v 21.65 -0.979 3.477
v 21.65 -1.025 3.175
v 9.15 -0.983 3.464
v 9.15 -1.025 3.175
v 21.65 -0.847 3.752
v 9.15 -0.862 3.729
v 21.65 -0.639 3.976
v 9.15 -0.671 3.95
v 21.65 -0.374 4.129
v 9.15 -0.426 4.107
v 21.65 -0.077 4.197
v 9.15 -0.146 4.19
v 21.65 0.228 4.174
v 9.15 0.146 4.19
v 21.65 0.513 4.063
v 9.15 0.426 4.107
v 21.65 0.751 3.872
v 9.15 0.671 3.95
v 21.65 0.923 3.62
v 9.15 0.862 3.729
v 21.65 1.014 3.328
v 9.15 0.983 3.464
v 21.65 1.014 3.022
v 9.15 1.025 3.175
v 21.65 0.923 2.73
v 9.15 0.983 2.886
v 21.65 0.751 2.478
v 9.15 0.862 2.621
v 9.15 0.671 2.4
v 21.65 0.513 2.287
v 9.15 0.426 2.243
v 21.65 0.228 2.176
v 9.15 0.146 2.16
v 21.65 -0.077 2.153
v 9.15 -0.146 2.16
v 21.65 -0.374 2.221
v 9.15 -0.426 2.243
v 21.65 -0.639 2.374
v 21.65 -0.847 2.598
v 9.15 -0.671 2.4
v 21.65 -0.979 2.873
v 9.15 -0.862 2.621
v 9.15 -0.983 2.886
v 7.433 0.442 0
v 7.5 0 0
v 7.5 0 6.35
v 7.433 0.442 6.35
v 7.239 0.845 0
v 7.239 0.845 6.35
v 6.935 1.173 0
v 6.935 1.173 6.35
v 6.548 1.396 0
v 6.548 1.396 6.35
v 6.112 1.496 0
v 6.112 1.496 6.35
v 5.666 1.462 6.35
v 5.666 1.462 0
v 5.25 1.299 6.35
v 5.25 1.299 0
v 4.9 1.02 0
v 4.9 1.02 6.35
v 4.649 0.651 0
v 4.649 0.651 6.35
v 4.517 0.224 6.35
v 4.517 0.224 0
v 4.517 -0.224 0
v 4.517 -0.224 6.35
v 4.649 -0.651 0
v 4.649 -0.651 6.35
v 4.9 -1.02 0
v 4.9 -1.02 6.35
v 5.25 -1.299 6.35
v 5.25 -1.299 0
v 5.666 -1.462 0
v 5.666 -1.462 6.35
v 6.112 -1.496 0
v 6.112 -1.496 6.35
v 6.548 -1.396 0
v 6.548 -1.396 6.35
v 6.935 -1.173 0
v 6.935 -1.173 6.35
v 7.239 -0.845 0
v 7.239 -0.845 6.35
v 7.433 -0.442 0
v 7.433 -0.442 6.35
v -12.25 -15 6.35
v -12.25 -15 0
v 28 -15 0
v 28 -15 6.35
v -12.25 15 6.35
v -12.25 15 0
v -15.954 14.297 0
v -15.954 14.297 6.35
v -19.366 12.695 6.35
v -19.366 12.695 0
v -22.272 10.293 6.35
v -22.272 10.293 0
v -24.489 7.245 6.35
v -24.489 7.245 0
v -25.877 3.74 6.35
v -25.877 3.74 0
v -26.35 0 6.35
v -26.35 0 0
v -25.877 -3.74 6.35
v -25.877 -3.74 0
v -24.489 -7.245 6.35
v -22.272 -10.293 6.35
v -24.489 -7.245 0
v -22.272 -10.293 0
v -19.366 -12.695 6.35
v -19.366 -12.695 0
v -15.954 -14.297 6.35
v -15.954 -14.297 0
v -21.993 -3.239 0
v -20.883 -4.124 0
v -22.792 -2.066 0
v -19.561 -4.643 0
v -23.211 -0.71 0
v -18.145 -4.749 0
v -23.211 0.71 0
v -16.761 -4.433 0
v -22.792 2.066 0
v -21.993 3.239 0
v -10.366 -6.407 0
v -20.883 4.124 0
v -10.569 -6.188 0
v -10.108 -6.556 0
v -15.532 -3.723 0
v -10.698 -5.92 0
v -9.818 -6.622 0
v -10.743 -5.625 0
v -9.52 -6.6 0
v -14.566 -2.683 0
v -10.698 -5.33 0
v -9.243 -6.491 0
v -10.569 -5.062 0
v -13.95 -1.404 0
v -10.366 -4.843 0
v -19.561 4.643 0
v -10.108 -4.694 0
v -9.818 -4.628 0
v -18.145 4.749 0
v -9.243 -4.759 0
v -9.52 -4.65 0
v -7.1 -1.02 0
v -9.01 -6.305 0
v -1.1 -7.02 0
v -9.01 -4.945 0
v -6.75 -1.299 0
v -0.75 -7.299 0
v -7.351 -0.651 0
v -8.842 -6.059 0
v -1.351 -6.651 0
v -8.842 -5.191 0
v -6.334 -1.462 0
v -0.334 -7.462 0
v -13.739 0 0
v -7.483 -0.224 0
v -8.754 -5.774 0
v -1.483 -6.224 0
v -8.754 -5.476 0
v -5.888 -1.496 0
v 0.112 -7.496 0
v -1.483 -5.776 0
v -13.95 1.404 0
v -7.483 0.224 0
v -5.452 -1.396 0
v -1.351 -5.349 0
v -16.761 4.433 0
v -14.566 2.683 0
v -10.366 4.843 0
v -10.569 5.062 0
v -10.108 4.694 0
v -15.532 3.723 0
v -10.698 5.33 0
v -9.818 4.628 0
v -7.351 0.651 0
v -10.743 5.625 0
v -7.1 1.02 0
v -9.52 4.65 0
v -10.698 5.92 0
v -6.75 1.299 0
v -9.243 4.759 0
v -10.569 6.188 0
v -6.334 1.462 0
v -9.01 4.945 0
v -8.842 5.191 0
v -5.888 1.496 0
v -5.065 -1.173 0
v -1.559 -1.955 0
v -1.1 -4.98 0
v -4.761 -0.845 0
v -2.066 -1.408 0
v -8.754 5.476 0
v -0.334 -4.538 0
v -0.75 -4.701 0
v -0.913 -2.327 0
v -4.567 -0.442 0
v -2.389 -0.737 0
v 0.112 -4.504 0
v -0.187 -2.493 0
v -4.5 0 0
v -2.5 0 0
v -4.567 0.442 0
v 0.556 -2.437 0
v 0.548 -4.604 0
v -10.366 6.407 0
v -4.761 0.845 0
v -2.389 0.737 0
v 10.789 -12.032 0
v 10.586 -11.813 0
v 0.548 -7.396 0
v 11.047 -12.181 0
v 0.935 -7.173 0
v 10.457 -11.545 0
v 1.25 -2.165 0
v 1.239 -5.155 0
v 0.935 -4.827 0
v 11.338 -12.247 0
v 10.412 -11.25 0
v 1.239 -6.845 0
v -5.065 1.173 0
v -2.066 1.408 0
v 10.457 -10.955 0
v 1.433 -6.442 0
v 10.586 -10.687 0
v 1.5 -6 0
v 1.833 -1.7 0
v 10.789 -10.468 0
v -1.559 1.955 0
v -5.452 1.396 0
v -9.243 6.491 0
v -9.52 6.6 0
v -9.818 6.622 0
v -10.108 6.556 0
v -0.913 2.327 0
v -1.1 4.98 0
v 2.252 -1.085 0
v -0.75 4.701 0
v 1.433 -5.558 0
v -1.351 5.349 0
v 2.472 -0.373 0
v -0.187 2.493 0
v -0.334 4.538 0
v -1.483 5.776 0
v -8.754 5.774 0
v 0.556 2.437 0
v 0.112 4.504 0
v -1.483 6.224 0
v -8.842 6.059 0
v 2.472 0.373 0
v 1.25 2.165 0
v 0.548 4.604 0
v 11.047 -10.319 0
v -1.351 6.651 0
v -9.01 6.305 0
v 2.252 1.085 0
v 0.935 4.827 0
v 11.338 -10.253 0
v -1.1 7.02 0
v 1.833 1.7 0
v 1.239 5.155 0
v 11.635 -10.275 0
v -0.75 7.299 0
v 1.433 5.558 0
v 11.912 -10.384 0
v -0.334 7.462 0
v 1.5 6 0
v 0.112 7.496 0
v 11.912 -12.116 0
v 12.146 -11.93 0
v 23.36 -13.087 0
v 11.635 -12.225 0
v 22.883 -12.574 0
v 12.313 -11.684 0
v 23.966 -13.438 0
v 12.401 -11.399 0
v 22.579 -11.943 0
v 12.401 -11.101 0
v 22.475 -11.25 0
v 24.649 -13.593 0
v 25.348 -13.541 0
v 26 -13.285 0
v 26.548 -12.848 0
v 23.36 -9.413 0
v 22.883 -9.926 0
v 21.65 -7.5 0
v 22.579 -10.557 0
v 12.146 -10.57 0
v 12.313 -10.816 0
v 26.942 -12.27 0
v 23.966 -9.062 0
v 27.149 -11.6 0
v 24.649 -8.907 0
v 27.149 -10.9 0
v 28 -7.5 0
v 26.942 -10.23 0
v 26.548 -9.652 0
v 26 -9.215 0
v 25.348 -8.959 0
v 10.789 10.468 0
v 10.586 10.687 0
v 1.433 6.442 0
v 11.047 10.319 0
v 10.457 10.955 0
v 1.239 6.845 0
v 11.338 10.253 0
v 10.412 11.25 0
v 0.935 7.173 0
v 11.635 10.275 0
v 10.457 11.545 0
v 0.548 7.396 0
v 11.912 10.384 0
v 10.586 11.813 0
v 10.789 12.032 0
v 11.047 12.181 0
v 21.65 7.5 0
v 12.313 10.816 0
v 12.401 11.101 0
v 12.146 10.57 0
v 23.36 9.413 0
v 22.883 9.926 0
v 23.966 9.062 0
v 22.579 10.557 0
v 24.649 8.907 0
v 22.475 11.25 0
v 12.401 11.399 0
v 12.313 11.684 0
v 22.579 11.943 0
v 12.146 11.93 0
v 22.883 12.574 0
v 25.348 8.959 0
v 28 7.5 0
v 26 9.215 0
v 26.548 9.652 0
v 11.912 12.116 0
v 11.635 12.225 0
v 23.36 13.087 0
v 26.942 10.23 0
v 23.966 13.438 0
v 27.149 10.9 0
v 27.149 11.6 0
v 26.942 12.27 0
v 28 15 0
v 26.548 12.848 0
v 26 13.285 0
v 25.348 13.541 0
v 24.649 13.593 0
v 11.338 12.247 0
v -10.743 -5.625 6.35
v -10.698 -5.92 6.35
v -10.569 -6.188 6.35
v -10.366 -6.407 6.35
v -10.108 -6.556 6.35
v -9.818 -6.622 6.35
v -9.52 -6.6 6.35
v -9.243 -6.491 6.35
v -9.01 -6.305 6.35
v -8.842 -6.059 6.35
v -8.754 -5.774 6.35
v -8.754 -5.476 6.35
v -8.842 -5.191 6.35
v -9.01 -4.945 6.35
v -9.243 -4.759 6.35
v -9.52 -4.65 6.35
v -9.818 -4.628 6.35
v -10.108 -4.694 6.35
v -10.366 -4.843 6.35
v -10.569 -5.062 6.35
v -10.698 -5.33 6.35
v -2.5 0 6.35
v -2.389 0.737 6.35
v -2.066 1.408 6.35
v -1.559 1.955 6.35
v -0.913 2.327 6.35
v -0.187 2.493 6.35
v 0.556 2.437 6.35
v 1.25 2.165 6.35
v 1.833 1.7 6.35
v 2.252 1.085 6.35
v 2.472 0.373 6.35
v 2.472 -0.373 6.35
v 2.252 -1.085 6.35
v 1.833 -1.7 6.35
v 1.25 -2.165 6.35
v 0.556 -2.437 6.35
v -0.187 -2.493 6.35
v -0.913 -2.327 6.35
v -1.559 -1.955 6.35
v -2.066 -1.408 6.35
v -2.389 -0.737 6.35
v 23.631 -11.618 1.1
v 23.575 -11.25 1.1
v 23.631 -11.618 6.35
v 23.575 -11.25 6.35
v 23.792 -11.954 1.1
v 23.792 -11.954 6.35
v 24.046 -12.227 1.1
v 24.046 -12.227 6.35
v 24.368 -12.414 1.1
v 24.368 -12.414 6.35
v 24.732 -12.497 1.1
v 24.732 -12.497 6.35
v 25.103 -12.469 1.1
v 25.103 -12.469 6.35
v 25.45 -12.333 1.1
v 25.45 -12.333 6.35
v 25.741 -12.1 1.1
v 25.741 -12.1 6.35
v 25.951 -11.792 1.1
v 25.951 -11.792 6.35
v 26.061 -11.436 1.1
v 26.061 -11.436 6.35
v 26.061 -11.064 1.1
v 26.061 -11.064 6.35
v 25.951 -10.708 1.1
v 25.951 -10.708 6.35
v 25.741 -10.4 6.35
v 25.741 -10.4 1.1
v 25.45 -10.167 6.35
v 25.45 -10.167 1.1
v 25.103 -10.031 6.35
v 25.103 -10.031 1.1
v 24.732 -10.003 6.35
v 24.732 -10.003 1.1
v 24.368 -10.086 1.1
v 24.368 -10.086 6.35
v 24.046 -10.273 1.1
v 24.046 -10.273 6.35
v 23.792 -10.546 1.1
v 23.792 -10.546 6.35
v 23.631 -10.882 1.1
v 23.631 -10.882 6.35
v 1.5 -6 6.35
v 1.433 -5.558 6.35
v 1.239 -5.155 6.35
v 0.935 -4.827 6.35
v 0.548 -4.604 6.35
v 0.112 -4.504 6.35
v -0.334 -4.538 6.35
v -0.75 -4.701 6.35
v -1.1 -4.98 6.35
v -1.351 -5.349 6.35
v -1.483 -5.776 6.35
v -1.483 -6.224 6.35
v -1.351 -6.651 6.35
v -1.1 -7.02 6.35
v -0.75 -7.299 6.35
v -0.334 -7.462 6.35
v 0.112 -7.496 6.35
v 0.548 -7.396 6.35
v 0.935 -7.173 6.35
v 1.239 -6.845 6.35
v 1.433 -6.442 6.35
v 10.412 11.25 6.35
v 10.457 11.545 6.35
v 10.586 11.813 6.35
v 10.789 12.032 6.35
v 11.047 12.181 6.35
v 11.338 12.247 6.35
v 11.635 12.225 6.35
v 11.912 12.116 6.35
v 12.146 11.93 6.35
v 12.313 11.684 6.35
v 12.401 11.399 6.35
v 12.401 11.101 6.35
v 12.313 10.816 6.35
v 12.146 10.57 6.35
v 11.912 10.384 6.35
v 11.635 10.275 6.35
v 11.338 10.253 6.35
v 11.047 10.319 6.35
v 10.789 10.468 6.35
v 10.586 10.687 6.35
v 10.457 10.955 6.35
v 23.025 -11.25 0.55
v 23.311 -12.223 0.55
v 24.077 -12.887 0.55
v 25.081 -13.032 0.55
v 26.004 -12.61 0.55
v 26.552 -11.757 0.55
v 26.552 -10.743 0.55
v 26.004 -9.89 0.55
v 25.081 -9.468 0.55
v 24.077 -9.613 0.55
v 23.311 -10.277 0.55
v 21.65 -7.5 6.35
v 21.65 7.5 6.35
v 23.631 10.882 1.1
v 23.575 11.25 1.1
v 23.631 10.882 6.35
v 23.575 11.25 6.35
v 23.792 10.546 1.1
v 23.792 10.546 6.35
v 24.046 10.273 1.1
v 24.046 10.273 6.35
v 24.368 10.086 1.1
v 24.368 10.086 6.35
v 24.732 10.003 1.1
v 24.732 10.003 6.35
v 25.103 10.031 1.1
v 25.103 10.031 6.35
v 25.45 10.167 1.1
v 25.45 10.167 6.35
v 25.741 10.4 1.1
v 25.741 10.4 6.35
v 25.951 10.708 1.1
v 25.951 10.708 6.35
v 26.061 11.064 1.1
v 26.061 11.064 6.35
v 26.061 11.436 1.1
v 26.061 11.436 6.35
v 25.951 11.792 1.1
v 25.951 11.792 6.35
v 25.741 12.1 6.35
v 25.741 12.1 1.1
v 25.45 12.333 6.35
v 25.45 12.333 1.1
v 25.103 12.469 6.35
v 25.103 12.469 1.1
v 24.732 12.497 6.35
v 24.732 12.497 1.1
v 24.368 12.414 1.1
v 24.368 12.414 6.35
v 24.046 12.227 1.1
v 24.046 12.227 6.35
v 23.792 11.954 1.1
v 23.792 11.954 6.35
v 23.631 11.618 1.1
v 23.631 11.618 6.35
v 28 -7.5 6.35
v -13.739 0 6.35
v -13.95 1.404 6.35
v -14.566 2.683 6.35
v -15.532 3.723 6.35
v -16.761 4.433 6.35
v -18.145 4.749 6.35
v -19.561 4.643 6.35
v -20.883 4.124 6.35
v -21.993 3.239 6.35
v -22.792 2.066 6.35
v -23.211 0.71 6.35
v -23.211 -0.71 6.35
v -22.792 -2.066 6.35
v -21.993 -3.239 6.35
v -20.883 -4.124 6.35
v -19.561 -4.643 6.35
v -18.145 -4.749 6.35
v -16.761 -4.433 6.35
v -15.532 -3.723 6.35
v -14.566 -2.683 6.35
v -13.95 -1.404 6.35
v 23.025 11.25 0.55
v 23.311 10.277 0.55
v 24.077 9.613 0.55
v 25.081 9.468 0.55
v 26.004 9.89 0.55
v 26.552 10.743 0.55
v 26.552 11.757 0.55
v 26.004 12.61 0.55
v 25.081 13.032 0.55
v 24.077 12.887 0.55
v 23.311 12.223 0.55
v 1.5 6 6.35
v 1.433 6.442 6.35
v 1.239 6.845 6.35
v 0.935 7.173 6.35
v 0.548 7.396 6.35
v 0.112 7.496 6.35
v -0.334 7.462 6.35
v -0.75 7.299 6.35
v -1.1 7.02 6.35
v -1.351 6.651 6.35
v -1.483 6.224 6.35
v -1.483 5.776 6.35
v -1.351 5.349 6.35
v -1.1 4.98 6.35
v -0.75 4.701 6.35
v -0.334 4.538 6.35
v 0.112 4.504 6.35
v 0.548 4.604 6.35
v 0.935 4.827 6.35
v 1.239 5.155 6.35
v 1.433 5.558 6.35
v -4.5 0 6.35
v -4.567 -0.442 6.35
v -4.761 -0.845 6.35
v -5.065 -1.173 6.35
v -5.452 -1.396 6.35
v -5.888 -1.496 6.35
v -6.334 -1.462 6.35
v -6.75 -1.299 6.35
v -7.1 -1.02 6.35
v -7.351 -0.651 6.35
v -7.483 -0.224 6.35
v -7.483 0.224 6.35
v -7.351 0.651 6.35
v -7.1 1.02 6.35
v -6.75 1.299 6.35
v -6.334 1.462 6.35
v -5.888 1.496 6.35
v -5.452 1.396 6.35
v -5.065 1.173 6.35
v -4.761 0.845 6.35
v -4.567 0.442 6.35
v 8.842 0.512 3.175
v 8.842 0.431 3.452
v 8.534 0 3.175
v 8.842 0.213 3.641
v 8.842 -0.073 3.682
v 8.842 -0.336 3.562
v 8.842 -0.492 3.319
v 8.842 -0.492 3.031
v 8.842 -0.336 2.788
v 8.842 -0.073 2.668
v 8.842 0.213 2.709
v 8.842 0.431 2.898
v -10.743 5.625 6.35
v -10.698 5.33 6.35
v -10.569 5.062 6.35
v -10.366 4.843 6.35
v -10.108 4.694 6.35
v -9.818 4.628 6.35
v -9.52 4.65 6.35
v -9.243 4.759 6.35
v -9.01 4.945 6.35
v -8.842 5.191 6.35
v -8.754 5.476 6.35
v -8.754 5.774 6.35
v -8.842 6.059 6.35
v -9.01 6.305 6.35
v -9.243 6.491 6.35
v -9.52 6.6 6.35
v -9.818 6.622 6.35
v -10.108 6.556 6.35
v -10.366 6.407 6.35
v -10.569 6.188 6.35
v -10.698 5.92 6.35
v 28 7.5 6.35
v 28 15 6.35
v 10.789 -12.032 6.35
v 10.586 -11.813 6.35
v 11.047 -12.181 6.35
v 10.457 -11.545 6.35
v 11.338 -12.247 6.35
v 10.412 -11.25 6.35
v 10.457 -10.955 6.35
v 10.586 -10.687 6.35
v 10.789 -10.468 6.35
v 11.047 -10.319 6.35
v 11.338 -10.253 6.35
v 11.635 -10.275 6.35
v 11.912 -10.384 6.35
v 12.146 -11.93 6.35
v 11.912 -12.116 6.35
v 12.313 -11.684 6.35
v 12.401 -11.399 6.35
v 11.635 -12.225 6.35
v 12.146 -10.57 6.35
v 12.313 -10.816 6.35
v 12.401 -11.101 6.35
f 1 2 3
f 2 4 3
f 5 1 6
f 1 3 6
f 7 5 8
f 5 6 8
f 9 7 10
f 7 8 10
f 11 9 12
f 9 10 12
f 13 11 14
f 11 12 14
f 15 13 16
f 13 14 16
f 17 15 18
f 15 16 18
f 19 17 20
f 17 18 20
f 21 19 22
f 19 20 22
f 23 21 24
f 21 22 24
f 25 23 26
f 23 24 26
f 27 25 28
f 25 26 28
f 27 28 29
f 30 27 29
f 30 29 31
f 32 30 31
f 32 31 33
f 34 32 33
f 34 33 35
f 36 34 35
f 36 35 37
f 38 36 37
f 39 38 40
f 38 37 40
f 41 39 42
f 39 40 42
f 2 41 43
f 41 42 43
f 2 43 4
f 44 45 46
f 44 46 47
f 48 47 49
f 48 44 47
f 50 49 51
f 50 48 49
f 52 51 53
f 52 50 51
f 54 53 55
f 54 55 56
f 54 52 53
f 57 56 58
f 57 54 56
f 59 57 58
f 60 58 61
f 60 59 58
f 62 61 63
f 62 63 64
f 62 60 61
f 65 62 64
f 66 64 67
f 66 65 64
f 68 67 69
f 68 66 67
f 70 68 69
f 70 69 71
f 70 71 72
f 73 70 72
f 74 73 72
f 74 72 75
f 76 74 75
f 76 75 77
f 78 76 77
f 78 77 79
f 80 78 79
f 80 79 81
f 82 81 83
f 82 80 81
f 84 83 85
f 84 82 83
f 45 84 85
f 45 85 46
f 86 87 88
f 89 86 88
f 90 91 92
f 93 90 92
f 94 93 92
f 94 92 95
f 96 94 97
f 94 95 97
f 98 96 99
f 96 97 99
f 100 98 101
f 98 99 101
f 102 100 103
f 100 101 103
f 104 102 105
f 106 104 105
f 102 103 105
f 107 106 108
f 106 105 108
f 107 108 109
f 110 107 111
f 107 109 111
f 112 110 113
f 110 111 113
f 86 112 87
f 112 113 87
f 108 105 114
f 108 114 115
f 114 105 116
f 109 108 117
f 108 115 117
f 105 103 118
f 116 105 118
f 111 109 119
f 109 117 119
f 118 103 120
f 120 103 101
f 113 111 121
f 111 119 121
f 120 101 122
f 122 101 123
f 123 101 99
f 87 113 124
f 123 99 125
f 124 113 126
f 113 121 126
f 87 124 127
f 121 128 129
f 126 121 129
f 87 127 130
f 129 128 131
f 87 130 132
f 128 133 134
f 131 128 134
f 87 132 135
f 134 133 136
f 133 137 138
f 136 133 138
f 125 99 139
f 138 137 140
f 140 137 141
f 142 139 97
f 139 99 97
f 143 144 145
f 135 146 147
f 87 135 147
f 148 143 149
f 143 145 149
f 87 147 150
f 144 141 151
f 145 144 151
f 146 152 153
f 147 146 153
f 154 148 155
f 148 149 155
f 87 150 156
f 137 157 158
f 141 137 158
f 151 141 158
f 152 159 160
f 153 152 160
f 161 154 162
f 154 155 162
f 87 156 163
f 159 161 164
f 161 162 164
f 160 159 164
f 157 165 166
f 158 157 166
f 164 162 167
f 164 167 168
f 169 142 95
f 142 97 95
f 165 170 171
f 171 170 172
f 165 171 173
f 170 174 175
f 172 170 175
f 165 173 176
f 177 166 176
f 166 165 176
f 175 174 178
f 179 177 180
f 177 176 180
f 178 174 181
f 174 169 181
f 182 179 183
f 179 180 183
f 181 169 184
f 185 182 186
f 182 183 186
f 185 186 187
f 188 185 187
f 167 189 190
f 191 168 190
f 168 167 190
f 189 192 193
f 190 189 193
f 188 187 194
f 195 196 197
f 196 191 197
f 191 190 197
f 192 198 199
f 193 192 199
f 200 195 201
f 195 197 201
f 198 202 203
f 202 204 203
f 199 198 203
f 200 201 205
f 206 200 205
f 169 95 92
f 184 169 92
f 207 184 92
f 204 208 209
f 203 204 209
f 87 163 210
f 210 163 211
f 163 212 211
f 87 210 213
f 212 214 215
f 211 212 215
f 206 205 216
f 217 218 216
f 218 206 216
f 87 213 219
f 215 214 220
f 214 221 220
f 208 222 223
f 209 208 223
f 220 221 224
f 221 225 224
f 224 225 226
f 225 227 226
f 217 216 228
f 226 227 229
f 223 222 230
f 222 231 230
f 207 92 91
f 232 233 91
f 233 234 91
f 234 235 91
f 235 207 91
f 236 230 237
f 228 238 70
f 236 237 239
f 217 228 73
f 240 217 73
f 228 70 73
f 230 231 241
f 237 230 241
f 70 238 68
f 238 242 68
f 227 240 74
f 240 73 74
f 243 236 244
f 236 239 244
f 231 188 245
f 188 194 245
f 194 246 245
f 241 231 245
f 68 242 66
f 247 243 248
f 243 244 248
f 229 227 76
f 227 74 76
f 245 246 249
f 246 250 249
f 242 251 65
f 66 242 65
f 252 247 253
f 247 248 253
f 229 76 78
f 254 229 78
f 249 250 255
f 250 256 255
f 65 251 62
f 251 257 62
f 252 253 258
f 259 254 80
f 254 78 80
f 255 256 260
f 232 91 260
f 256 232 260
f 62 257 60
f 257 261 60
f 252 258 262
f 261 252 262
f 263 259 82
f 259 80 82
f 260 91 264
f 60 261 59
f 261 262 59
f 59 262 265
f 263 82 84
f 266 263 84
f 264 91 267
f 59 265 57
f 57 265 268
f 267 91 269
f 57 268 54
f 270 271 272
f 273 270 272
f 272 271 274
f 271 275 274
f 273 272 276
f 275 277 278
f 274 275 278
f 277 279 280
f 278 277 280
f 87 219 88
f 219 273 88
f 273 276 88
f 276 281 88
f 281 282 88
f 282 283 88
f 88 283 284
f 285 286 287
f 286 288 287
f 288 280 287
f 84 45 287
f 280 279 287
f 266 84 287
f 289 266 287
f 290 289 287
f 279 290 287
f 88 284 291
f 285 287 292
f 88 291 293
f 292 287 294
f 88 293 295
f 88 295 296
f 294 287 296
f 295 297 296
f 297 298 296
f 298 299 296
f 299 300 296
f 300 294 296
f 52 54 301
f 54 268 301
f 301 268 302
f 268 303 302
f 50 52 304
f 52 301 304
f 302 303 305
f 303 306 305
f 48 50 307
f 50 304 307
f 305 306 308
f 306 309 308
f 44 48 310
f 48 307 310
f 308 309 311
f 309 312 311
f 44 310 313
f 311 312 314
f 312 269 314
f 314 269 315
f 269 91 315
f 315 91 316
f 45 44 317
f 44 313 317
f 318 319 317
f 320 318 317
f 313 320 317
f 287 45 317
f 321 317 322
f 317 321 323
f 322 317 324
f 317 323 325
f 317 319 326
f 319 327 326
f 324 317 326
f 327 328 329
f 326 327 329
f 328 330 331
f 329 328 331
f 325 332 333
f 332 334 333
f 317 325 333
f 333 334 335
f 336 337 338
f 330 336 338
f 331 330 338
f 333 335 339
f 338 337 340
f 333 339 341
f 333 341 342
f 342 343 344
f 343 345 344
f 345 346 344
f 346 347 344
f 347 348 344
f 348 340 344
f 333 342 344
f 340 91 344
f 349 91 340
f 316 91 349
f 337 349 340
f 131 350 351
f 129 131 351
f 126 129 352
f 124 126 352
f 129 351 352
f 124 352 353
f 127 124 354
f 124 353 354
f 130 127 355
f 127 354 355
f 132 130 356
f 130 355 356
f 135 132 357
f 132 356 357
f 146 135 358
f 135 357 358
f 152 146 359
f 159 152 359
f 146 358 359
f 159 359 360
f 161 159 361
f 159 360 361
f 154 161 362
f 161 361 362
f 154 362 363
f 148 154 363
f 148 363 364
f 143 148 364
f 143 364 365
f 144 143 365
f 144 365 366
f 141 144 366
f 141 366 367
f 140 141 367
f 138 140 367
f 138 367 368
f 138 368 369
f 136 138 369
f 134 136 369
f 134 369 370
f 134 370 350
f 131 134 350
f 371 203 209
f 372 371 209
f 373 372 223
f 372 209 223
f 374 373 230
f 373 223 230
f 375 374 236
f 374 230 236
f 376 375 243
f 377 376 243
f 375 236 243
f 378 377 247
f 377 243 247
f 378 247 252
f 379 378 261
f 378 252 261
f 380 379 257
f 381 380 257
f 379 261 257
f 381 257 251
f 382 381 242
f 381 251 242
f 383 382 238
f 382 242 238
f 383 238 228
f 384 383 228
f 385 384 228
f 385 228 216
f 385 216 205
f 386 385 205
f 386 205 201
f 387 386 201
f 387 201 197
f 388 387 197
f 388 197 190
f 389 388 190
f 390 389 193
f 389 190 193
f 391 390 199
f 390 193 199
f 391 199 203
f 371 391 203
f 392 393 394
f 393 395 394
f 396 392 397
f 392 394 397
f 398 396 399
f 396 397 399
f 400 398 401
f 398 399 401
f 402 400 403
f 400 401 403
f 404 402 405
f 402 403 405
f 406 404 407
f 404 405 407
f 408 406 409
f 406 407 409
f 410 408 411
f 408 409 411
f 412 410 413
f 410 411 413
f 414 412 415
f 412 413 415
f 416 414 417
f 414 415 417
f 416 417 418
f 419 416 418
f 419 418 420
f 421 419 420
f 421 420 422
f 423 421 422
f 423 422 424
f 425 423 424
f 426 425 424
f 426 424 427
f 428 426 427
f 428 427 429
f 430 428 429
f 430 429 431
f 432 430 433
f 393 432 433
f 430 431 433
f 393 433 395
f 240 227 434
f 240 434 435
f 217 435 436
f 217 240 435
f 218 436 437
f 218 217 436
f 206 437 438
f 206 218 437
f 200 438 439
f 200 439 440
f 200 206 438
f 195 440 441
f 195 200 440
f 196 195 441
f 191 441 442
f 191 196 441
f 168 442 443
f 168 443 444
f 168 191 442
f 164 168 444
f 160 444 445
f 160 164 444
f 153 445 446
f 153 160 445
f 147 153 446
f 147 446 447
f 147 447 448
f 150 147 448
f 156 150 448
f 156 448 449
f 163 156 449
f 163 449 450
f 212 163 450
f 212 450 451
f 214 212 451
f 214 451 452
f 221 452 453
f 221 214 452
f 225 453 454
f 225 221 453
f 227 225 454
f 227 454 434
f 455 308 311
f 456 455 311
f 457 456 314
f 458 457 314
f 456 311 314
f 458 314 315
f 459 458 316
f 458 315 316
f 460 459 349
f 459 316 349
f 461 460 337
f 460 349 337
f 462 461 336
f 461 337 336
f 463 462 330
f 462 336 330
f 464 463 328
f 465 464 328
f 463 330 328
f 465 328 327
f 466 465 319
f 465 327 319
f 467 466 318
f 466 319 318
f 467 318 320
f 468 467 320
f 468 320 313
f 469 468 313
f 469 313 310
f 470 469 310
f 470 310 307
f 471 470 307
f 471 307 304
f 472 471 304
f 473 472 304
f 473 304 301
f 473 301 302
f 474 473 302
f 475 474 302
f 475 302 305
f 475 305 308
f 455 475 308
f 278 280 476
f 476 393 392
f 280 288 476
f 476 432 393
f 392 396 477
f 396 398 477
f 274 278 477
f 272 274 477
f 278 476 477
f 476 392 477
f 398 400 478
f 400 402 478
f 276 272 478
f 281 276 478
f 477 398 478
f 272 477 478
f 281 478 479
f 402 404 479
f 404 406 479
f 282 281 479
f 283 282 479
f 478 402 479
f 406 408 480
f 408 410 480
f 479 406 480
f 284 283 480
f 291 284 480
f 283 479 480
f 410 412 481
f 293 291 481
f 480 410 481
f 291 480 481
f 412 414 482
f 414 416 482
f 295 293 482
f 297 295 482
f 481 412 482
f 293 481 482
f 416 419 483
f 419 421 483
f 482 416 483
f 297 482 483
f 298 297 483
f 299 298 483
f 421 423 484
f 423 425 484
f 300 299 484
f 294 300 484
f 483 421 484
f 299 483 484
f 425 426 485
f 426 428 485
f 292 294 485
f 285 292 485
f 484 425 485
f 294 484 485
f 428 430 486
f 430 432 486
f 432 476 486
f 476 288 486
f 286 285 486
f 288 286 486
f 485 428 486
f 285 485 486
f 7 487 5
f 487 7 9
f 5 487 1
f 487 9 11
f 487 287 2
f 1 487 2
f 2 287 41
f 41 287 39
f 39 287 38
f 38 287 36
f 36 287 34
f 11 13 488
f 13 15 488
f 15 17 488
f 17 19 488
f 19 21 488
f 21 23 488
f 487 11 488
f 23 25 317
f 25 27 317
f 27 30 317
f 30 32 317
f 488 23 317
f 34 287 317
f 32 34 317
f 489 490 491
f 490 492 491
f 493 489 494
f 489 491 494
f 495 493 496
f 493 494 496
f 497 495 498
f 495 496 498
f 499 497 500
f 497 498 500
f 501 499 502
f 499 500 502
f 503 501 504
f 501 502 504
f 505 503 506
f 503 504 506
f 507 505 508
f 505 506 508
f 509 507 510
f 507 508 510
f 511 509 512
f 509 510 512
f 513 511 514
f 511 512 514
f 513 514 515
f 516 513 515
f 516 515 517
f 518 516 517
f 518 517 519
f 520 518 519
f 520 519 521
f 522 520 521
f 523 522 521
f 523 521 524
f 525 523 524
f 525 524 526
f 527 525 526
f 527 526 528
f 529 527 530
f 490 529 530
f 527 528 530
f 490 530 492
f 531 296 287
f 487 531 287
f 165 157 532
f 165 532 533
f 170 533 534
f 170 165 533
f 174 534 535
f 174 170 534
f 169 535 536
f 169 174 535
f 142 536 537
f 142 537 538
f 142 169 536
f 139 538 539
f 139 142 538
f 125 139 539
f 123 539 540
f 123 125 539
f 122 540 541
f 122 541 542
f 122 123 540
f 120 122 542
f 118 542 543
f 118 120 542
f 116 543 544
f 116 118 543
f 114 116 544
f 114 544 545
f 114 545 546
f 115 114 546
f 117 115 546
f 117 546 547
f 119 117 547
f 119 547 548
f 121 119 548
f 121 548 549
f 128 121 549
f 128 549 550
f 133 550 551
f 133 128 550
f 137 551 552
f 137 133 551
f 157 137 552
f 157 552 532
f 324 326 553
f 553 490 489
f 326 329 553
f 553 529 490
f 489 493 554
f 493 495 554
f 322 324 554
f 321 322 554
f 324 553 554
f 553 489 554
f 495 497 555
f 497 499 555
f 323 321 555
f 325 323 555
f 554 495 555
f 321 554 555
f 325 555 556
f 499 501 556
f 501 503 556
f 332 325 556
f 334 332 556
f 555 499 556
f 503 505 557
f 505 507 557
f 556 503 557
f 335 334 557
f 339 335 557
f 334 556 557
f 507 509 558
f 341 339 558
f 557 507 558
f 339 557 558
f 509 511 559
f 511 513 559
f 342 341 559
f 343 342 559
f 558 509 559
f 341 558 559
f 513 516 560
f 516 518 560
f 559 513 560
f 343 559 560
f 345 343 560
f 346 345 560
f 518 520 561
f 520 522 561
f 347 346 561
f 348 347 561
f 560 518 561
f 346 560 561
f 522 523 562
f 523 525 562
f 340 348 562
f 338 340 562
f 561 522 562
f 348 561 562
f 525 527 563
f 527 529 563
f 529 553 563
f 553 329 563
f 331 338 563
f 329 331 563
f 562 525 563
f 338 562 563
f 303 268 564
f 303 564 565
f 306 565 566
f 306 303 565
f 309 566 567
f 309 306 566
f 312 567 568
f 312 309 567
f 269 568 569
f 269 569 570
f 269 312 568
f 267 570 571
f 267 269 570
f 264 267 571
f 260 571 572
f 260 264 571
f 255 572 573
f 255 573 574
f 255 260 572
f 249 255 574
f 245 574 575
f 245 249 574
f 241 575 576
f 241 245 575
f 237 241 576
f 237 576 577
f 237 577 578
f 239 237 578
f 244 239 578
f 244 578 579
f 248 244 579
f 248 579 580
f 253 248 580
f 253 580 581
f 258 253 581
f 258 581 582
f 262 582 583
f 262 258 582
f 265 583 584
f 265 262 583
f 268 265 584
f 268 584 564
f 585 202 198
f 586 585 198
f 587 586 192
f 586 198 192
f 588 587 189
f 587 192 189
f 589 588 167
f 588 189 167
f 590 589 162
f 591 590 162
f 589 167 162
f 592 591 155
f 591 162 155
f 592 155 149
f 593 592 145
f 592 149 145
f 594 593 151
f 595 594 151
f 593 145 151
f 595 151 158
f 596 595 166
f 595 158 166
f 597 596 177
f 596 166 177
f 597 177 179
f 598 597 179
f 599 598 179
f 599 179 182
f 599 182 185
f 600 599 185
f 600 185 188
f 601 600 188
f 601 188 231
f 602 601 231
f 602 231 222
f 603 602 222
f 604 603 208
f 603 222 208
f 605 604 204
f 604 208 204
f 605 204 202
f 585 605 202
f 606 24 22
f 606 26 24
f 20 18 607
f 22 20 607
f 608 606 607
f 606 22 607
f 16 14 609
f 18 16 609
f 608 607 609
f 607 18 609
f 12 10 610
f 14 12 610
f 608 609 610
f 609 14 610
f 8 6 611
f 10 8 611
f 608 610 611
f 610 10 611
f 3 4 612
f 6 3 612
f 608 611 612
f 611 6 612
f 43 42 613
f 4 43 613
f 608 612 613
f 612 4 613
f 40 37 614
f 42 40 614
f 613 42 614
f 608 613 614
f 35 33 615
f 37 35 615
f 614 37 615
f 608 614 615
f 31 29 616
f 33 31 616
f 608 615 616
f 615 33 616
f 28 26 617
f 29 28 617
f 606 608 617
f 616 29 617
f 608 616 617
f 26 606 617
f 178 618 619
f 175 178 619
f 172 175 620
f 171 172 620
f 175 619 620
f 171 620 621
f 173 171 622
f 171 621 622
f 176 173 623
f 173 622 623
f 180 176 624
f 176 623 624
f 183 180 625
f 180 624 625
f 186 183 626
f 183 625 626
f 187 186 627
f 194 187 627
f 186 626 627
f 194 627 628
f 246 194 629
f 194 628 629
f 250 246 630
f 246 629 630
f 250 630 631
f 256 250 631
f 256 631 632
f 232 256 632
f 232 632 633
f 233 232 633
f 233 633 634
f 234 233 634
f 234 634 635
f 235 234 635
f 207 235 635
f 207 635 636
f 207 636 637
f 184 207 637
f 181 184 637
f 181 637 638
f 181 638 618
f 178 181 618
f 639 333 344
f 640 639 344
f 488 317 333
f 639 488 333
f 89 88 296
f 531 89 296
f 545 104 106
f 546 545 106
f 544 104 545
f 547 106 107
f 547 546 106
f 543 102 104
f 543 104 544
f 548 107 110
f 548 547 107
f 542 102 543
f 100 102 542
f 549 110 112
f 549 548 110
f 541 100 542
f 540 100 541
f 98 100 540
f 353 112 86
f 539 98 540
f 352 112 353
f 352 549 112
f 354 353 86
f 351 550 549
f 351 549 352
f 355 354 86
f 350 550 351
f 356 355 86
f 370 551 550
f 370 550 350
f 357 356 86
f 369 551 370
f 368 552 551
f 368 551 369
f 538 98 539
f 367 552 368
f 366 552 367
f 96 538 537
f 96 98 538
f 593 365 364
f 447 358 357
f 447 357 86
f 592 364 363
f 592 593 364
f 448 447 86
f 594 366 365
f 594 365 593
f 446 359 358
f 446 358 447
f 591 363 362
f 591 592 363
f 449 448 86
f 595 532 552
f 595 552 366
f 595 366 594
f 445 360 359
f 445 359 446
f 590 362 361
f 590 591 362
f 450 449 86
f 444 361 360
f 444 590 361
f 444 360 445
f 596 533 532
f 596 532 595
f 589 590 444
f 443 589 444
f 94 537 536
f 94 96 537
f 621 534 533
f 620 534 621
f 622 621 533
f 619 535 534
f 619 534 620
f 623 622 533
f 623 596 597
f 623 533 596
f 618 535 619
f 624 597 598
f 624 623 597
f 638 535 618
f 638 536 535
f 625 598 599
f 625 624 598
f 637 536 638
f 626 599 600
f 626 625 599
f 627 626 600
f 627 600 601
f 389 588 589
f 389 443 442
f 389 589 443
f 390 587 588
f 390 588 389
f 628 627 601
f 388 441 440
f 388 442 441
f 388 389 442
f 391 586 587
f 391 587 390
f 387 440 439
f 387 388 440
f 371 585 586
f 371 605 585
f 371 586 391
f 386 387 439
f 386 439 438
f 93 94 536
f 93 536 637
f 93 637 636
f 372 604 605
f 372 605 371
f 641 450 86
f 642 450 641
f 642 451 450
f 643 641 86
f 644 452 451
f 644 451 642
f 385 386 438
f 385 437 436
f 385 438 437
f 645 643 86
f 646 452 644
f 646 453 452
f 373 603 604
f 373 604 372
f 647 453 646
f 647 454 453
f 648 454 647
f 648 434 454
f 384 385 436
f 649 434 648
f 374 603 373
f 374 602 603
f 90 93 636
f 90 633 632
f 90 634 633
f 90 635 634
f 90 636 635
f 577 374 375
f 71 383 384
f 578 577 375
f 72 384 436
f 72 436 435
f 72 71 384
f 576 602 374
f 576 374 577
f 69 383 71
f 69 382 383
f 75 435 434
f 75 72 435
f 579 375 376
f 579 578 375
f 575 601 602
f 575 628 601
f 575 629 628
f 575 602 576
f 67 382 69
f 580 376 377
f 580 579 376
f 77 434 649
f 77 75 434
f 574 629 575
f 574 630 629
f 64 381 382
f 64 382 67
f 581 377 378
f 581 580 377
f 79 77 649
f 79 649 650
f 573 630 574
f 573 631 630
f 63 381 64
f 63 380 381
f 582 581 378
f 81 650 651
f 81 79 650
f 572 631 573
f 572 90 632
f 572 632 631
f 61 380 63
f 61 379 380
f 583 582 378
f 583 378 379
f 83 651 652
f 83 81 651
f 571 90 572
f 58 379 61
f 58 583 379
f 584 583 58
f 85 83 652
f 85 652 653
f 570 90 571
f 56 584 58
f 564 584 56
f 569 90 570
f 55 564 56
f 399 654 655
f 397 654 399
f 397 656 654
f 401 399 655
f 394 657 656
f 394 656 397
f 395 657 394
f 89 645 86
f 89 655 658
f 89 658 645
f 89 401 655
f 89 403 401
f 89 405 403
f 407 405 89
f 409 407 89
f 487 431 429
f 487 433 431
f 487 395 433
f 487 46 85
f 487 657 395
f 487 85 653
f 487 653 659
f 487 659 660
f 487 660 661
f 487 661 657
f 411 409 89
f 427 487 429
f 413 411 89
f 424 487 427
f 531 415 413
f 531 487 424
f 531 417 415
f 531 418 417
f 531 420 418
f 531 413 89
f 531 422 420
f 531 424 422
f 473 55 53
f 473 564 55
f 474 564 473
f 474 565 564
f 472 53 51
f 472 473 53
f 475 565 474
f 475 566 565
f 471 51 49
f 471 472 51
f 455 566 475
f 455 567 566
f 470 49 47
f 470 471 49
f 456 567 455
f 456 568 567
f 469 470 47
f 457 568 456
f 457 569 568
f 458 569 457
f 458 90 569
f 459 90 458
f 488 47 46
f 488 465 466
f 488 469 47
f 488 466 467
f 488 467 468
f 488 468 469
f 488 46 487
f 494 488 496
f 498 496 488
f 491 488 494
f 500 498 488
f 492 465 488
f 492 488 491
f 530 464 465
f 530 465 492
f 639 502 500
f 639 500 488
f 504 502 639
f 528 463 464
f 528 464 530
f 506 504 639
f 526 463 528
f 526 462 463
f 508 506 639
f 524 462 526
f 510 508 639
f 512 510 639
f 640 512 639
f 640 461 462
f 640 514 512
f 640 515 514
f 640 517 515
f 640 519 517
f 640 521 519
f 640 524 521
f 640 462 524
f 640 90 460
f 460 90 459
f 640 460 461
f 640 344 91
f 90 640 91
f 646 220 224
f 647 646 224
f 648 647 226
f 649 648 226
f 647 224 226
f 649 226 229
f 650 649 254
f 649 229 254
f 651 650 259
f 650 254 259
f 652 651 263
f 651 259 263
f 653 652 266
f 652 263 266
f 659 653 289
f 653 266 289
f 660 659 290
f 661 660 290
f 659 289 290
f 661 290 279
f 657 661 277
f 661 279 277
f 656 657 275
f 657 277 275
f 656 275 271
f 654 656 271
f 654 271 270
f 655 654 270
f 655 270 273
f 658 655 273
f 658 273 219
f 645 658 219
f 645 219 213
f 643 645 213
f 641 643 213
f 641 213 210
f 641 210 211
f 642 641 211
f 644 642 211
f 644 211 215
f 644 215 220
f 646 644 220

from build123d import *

# Parameters (mm, degrees)
F0_R           = 1.5
F0_R_2         = 4.7625
F1_DEPTH       = 6.35
F2_D           = 2.5
F2_CSINK_D     = 4.7
F2_CSINK_ANGLE = 90
F4_D           = 2.05
F4_DEPTH       = 12.5
F4_TIP         = 0.6158821345
F5_D           = 2
F5_DEPTH       = 8
F5_TIP         = 0.600860619
F7_D           = 2
F7_DEPTH       = 8
F7_TIP         = 0.600860619


# Not quite as in the source:
# - a length typed as a fraction of an inch, garbled in the dataset ("3 / 203.2 mm" for 3/8 in), is restored


with BuildPart() as f1:
    # F0 (on Top) → F1 (new body)
    with BuildSketch(Plane.XY):
        with BuildLine():
            Line((28, 15), (-12.25, 15))
            ThreePointArc((-12.25, 15), (-26.35, 0), (-12.25, -15))
            Line((-12.25, -15), (28, -15))
            Line((28, -15), (28, -7.5))
            Line((28, -7.5), (21.65, -7.5))
            Line((21.65, -7.5), (21.65, 7.5))
            Line((21.65, 7.5), (28, 7.5))
            Line((28, 7.5), (28, 15))
        make_face()
        with Locations((0, -6)):
            Circle(F0_R, mode=Mode.SUBTRACT)
        with Locations((-18.5013860464, 0)):
            Circle(F0_R_2, mode=Mode.SUBTRACT)
        with BuildLine():
            ThreePointArc((-7.5, 0), (-6, 1.5), (-4.5, 0))
            ThreePointArc((-4.5, 0), (-6, -1.5), (-7.5, 0))
        make_face(mode=Mode.SUBTRACT)
        with BuildLine():
            ThreePointArc((2.5, 0), (0, -2.5), (-2.5, 0))
            ThreePointArc((-2.5, 0), (0, 2.5), (2.5, 0))
        make_face(mode=Mode.SUBTRACT)
        with Locations((0, 6)):
            Circle(F0_R, mode=Mode.SUBTRACT)
        with Locations((6, 0)):
            Circle(F0_R, mode=Mode.SUBTRACT)
    extrude(amount=F1_DEPTH)

    # F2 (through all)
    with Locations(Plane(origin=(0, 0, 0), x_dir=(1, 0, 0), z_dir=(0, 0, -1))):
        with Locations((24.825, -11.25), (24.825, 11.25)):
            CounterSinkHole(F2_D / 2, F2_CSINK_D / 2, counter_sink_angle=F2_CSINK_ANGLE)

    # F4
    with Locations(Plane.YZ.offset(21.65)):
        with Locations((0, 3.175)):
            Hole(F4_D / 2, depth=F4_DEPTH)
            with Locations((0, 0, -(F4_DEPTH + F4_TIP / 2))):  # 118° drill point
                Cone(0, F4_D / 2, F4_TIP, mode=Mode.SUBTRACT)

    # F5
    with Locations(Plane(origin=(0, 0, 0), x_dir=(1, 0, 0), z_dir=(0, 0, -1))):
        with Locations((-9.7427857926, 5.625), (-9.7427857926, -5.625)):
            Hole(F5_D / 2, depth=F5_DEPTH)
            with Locations((0, 0, -(F5_DEPTH + F5_TIP / 2))):  # 118° drill point
                Cone(0, F5_D / 2, F5_TIP, mode=Mode.SUBTRACT)

    # F7
    with Locations(Plane.XY.offset(6.35)):
        with Locations((11.4125, -11.25), (11.4125, 11.25)):
            Hole(F7_D / 2, depth=F7_DEPTH)
            with Locations((0, 0, -(F7_DEPTH + F7_TIP / 2))):  # 118° drill point
                Cone(0, F7_D / 2, F7_TIP, mode=Mode.SUBTRACT)


solid = f1.part
